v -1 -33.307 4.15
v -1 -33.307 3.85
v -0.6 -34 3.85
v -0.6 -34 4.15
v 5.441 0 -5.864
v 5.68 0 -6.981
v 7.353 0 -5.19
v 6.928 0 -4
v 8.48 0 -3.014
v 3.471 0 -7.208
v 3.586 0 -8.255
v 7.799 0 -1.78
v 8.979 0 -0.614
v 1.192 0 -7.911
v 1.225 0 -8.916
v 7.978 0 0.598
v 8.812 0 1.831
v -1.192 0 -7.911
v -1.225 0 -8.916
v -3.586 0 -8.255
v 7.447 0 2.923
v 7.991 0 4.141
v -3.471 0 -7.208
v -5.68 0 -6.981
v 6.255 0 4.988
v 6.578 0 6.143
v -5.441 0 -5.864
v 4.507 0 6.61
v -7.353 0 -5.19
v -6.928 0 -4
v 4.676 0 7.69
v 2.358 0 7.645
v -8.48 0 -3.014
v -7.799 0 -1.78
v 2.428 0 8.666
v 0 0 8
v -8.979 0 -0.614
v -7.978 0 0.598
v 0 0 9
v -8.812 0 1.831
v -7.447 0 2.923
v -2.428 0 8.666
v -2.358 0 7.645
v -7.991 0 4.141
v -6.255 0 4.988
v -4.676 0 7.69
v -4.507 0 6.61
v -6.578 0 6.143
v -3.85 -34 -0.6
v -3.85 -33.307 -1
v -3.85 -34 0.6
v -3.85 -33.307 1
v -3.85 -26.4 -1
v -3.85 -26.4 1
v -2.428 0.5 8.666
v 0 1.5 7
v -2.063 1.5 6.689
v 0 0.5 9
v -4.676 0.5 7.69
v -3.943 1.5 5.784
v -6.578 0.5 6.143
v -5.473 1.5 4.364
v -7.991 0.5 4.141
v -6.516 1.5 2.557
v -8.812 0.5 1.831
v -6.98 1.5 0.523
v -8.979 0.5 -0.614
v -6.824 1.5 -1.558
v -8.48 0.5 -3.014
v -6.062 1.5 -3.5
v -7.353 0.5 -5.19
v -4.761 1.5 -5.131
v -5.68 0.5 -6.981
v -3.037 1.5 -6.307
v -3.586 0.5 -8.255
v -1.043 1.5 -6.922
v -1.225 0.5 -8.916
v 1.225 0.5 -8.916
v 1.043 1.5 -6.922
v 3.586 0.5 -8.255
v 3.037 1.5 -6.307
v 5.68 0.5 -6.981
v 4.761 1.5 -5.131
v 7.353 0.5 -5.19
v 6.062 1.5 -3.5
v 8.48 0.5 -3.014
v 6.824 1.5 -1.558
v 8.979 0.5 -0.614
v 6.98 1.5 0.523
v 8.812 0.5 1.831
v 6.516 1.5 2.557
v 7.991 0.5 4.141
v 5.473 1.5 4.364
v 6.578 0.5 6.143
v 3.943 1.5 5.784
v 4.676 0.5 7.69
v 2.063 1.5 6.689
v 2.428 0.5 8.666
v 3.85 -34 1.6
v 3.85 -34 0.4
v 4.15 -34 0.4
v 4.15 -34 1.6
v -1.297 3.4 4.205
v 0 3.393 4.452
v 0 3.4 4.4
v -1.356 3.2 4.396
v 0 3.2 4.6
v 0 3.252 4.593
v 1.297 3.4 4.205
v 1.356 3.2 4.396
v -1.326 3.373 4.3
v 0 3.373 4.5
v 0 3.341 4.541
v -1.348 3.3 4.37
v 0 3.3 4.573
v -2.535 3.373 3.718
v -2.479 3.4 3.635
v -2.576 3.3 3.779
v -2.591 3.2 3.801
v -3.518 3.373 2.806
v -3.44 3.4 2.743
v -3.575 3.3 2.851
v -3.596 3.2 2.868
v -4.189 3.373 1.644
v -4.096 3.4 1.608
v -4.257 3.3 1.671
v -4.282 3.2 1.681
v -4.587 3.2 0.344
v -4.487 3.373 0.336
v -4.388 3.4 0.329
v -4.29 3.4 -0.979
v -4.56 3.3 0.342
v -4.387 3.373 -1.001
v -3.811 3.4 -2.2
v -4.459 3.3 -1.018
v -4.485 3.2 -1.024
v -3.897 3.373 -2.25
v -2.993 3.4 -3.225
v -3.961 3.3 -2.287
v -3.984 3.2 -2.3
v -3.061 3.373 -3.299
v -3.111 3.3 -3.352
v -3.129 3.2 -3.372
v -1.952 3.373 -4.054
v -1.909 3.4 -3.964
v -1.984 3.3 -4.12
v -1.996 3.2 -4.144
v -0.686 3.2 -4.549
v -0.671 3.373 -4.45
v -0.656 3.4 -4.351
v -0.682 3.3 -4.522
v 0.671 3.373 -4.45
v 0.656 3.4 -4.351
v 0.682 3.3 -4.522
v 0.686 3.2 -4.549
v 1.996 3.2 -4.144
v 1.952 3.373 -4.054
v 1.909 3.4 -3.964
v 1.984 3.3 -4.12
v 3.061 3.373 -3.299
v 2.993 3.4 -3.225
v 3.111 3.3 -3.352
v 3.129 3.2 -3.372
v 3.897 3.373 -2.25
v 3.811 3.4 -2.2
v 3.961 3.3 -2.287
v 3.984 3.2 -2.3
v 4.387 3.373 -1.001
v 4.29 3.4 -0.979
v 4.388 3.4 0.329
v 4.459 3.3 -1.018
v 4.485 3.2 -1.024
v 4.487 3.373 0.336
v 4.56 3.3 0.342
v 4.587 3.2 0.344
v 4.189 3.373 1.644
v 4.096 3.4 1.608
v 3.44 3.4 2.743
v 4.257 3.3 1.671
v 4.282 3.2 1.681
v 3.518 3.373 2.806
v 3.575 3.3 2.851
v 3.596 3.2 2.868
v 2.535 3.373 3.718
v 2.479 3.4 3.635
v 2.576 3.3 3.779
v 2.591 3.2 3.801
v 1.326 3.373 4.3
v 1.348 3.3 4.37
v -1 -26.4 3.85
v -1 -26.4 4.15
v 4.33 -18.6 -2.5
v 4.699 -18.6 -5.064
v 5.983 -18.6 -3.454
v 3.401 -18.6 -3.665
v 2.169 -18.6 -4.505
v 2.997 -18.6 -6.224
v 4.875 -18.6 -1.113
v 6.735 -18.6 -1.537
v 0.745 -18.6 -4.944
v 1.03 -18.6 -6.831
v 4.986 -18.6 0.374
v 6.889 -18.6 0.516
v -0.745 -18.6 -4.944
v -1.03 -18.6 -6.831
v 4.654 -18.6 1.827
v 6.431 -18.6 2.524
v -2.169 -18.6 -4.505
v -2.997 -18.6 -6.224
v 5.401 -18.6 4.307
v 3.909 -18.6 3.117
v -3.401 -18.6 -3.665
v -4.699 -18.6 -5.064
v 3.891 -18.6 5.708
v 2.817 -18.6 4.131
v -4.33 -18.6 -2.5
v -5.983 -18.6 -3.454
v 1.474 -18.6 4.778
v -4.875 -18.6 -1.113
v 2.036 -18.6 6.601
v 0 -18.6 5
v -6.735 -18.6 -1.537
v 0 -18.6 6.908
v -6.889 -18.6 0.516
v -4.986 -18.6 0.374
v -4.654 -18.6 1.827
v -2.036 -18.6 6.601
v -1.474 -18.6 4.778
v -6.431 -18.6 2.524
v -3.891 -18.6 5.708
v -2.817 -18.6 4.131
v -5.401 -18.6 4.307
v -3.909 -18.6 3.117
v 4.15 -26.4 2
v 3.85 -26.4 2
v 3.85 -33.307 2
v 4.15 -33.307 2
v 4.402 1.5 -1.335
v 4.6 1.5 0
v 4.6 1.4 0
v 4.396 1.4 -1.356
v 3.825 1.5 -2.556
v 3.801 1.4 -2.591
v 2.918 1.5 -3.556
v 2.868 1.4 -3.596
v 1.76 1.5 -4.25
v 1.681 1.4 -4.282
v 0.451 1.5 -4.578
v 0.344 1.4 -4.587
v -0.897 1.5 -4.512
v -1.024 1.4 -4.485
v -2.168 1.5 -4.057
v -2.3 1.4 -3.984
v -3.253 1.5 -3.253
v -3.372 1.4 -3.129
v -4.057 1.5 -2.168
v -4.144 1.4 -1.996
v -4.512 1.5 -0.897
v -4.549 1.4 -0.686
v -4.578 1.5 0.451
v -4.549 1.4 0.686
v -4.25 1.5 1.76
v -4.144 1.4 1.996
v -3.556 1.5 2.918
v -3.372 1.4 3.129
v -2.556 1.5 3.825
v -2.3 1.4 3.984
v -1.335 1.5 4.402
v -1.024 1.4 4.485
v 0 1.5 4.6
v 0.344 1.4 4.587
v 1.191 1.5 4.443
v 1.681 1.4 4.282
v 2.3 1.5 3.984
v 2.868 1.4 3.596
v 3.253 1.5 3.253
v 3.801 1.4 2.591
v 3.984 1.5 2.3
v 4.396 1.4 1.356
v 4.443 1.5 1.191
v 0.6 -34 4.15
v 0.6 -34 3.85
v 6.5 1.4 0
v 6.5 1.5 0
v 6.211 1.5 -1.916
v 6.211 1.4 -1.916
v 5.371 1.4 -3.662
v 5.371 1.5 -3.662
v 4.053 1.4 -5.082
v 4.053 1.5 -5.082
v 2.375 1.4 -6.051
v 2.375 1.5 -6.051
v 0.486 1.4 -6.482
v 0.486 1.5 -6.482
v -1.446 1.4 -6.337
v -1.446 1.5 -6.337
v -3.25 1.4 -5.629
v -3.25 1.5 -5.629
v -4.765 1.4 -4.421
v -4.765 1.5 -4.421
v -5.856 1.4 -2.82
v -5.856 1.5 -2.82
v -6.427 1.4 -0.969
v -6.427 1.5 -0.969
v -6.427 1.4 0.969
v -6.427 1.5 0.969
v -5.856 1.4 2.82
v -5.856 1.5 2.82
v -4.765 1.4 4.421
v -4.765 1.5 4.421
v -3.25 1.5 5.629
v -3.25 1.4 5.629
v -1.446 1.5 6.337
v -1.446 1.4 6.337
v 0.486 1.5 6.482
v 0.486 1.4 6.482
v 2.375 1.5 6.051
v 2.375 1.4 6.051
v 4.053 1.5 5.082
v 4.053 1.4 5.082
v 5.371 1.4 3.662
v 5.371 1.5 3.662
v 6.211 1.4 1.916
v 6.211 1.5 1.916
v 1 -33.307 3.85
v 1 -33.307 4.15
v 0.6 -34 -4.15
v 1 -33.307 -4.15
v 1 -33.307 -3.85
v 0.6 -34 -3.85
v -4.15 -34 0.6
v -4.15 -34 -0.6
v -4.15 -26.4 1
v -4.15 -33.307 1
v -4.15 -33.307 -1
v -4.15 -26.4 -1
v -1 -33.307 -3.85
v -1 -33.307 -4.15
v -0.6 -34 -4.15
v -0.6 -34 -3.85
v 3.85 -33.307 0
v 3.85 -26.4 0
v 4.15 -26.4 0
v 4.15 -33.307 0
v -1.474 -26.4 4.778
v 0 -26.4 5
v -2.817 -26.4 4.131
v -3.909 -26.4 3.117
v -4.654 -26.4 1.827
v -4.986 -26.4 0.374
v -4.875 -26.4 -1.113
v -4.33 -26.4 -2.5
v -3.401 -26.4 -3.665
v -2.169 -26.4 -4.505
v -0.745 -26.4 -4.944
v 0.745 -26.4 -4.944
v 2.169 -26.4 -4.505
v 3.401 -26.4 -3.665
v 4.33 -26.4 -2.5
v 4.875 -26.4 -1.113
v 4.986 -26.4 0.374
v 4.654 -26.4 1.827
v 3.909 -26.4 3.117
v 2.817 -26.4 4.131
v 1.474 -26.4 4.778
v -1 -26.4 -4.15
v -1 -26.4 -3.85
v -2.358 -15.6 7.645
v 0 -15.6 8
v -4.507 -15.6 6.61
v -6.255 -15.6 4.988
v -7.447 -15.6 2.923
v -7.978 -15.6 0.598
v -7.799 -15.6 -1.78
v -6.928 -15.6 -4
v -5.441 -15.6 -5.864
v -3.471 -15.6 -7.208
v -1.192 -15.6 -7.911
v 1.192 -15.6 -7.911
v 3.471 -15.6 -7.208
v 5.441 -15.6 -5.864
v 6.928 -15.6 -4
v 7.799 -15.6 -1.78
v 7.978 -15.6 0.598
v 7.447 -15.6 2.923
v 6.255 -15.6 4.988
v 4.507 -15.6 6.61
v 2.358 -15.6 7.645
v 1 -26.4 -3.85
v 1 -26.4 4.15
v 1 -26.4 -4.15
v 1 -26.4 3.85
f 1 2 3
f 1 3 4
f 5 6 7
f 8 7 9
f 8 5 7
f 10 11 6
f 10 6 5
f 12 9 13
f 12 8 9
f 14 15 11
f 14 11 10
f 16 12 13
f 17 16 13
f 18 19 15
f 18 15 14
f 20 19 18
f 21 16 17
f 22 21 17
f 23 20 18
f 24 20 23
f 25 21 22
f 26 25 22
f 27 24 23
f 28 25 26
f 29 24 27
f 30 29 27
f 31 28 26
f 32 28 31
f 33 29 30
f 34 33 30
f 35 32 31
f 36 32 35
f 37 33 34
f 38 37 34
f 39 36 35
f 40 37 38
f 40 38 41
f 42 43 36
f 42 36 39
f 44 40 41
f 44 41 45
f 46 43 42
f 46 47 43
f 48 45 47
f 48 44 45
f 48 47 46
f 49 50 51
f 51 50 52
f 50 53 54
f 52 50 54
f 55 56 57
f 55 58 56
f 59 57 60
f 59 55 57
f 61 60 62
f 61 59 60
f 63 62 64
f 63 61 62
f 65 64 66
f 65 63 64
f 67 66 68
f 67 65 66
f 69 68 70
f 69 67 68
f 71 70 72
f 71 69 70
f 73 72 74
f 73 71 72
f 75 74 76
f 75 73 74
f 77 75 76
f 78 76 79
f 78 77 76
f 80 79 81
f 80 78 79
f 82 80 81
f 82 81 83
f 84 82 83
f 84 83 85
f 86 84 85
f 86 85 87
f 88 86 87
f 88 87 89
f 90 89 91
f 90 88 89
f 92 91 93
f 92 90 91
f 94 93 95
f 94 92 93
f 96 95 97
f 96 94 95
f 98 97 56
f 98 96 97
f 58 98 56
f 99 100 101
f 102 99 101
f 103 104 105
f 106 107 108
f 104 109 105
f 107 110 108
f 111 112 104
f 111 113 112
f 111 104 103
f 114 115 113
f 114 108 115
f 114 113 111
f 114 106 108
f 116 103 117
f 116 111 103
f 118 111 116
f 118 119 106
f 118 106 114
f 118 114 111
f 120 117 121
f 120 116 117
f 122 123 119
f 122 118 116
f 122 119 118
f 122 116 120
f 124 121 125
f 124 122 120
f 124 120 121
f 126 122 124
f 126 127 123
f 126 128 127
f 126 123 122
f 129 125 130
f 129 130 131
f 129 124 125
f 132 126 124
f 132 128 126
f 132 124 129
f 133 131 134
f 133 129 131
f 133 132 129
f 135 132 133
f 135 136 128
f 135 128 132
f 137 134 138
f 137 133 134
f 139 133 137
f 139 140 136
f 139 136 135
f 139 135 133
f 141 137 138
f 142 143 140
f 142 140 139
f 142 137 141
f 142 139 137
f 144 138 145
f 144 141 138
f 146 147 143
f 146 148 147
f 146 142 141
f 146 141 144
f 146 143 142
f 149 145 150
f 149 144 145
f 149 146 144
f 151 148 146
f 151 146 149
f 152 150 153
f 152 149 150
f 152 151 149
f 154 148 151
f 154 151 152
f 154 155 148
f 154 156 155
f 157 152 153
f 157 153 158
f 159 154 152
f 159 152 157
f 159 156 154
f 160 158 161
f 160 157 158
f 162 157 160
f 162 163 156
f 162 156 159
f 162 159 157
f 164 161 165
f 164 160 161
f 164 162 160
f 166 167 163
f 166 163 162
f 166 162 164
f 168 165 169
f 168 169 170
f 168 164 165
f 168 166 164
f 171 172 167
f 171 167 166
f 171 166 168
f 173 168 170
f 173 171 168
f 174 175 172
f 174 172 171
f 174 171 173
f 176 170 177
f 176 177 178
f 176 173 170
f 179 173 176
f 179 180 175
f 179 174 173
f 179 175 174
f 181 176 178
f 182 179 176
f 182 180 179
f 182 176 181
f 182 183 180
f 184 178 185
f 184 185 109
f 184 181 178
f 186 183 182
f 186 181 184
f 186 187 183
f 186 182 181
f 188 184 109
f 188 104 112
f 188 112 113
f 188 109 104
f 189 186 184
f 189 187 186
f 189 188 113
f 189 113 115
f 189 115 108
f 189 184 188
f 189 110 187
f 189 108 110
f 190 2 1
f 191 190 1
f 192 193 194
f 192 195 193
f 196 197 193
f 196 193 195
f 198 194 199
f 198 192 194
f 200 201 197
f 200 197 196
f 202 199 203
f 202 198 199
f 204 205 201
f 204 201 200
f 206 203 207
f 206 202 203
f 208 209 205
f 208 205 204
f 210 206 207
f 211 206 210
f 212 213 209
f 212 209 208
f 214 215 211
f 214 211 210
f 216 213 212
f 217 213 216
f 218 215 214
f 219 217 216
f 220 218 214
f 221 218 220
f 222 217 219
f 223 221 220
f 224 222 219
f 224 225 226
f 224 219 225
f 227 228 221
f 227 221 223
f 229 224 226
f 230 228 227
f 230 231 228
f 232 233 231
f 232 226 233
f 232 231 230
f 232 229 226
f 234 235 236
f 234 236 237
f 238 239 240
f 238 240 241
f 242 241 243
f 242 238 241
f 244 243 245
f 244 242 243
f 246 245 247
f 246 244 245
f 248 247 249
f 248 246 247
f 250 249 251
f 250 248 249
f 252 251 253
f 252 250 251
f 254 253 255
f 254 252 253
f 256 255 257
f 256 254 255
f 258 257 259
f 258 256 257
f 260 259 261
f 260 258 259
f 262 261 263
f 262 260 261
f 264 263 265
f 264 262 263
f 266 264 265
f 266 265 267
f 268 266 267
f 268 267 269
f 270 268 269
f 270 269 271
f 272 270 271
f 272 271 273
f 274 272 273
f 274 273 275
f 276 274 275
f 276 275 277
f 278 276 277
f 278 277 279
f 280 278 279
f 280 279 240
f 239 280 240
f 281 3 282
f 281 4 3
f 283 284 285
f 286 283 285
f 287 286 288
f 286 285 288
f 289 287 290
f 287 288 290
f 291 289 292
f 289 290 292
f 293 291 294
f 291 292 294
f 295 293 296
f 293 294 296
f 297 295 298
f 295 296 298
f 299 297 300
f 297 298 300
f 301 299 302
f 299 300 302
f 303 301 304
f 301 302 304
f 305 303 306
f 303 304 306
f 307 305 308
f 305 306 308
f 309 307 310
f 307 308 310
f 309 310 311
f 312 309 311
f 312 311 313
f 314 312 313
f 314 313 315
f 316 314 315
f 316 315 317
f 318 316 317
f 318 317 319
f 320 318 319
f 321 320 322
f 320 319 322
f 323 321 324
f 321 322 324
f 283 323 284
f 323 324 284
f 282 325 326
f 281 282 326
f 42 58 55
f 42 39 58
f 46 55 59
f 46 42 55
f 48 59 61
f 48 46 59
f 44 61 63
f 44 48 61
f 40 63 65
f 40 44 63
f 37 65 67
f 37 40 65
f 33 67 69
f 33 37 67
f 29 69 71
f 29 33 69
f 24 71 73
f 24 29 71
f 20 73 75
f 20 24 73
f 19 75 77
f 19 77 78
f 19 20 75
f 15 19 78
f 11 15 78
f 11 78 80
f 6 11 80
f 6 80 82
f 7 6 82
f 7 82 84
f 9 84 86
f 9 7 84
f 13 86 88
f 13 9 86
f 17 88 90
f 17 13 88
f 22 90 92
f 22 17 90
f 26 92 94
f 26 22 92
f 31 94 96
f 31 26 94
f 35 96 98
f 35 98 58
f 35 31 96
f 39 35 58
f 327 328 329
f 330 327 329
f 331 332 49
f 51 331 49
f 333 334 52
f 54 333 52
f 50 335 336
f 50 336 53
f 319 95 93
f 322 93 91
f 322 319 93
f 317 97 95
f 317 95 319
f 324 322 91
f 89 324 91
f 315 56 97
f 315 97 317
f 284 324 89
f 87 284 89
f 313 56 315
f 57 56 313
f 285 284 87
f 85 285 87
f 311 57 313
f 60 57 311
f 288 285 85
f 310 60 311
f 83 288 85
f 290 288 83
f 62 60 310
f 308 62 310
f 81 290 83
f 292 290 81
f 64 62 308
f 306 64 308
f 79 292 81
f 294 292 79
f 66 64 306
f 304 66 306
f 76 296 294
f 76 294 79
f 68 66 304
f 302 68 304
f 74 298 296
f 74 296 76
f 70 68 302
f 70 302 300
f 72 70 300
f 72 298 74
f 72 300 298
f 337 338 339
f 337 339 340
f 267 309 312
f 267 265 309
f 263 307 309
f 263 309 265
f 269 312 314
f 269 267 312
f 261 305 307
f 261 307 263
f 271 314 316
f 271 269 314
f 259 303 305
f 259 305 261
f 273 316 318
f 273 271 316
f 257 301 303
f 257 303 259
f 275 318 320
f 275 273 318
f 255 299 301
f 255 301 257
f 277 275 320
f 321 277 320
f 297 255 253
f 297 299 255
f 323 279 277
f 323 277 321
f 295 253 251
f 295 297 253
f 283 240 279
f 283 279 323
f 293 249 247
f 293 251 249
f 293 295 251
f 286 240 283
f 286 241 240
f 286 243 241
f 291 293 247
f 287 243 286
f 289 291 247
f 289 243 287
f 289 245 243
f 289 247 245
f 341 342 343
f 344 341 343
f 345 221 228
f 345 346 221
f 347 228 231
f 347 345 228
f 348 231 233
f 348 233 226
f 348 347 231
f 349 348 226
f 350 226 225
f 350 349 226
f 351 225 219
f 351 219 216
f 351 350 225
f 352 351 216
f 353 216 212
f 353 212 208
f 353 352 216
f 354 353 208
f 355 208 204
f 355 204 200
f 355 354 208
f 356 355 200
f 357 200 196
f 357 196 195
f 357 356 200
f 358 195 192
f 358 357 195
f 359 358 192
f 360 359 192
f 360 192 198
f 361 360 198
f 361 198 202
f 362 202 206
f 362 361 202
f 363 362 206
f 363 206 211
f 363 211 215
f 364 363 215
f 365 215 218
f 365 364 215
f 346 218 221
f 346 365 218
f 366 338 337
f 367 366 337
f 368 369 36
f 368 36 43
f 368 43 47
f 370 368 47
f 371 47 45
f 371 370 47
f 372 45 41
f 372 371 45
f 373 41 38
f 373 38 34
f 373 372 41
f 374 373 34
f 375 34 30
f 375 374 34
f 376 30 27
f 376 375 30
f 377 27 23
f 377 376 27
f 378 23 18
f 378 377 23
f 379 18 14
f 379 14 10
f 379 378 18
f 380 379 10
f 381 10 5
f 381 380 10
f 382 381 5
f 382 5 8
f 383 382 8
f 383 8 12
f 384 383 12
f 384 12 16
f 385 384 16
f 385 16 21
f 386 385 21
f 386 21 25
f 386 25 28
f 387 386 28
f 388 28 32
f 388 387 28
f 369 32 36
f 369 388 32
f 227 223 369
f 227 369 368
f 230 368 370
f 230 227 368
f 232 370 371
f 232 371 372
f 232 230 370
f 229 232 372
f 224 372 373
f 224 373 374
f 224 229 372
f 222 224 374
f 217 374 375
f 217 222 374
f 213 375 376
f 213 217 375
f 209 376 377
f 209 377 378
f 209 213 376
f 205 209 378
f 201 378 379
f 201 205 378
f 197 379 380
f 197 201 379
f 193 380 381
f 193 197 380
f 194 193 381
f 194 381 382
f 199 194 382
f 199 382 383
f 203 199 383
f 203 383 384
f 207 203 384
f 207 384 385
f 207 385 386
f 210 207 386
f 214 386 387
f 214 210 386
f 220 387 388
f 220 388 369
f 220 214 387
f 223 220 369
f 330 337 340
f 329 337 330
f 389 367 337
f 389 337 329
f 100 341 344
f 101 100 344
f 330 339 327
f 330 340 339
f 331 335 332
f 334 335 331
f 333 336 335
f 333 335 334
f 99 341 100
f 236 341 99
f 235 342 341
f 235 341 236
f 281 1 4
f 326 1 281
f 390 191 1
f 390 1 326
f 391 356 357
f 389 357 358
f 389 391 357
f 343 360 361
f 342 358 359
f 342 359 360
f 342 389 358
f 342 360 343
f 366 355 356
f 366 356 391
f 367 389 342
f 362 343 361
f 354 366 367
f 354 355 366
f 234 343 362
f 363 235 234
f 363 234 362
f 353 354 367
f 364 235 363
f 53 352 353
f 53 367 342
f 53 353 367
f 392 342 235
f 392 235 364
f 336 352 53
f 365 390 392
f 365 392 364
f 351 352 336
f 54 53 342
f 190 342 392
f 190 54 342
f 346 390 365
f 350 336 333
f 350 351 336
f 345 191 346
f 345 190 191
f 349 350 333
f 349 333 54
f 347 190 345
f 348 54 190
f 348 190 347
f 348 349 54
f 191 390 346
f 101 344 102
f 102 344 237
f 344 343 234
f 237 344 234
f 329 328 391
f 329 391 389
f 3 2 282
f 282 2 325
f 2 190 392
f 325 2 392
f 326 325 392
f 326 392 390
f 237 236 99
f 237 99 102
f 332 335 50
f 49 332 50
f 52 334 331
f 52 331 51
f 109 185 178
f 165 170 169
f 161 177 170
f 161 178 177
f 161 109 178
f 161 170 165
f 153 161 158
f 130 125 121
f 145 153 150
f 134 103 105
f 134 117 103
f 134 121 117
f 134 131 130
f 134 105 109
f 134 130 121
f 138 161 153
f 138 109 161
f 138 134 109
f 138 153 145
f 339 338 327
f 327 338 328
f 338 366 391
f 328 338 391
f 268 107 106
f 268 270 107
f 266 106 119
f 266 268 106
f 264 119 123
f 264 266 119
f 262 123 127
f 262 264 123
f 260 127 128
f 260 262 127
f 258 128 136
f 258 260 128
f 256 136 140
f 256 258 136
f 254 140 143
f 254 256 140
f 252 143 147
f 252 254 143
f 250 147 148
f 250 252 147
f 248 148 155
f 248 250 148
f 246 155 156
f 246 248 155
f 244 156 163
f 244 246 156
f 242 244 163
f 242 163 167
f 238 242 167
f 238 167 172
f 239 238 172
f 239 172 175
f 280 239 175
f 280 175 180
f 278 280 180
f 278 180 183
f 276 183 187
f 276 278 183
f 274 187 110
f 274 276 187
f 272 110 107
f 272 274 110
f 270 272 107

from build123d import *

# Parameters (mm, degrees)
FILLET1_R             = 0.2
SKETCH2_R             = 6.5
SKETCH2_R_2           = 4.6
CUT_EXTRUDE1_DEPTH    = 0.1
SKETCH3_W             = 2
SKETCH3_H             = 0.3
SKETCH3_W_2           = 0.3
SKETCH3_H_2           = 2
EXTRUDE_THIN1_DEPTH   = 7.6
CHAMFER1_SIZE         = 0.4
CHAMFER1_SIZE2        = 0.692820323
CHAMFER1_PART_2_SIZE  = 0.4
CHAMFER1_PART_2_SIZE2 = 0.692820323
CHAMFER1_PART_3_SIZE  = 0.4
CHAMFER1_PART_3_SIZE2 = 0.692820323
CHAMFER1_PART_4_SIZE  = 0.4
CHAMFER1_PART_4_SIZE2 = 0.692820323
CHAMFER2_SIZE         = 3
CHAMFER2_SIZE2        = 1.091910703


with BuildPart() as part:
    # Sketch1 → Revolve1 (revolve)
    with BuildSketch(Plane(origin=(0, 0, 0), x_dir=(0, 0, -1), z_dir=(1, 0, 0))):
        Polygon((0, 3.4), (-4.6, 3.4), (-4.6, 1.5), (-7, 1.5), (-9, 0.5), (-9, 0), (-8, 0), (-8, -18.6), (-5, -18.6), (-5, -26.4), (0, -26.4), align=None)
    revolve(axis=Axis((0, 14.375, 0), (0, -1, 0)))

    # Fillet1
    fillet1_edges = [part.edges().sort_by_distance(p)[0] for p in [
        (0, 3.4, -4.6),
    ]]
    fillet(fillet1_edges, radius=FILLET1_R)

    # Sketch2 → Cut-Extrude1 (cut)
    with BuildSketch(Plane(origin=(0, 1.5, 0), x_dir=(1, 0, 0), z_dir=(0, 1, 0))):
        Circle(SKETCH2_R)
        Circle(SKETCH2_R_2, mode=Mode.SUBTRACT)
    extrude(amount=-CUT_EXTRUDE1_DEPTH, mode=Mode.SUBTRACT)

    # Sketch3 → Extrude-Thin1 (add)
    with BuildSketch(Plane.XZ.offset(26.4)):
        with Locations((0, 4)):
            Rectangle(SKETCH3_W, SKETCH3_H)
        with Locations((0, -4)):
            Rectangle(SKETCH3_W, SKETCH3_H)
        with Locations((-4, 0)):
            Rectangle(SKETCH3_W_2, SKETCH3_H_2)
        with Locations((4, 1)):
            Rectangle(SKETCH3_W_2, SKETCH3_H_2)
    extrude(amount=EXTRUDE_THIN1_DEPTH)

    # Chamfer1
    chamfer1_edges = [part.edges().sort_by_distance(p)[0] for p in [
        (1, -34, 4),
        (-1, -34, 4),
    ]]
    chamfer1_side = [part.faces().sort_by_distance(p)[0] for p in [
        (0, -34, 4),
    ]]
    chamfer(chamfer1_edges, length=CHAMFER1_SIZE, length2=CHAMFER1_SIZE2, reference=chamfer1_side[0])

    # Chamfer1 part 2
    chamfer1_part_2_edges = [part.edges().sort_by_distance(p)[0] for p in [
        (1, -34, -4),
        (-1, -34, -4),
    ]]
    chamfer1_part_2_side = [part.faces().sort_by_distance(p)[0] for p in [
        (0, -34, -4),
    ]]
    chamfer(chamfer1_part_2_edges, length=CHAMFER1_PART_2_SIZE, length2=CHAMFER1_PART_2_SIZE2, reference=chamfer1_part_2_side[0])

    # Chamfer1 part 3
    chamfer1_part_3_edges = [part.edges().sort_by_distance(p)[0] for p in [
        (-4, -34, -1),
        (-4, -34, 1),
    ]]
    chamfer1_part_3_side = [part.faces().sort_by_distance(p)[0] for p in [
        (-4, -34, 0),
    ]]
    chamfer(chamfer1_part_3_edges, length=CHAMFER1_PART_3_SIZE, length2=CHAMFER1_PART_3_SIZE2, reference=chamfer1_part_3_side[0])

    # Chamfer1 part 4
    chamfer1_part_4_edges = [part.edges().sort_by_distance(p)[0] for p in [
        (4, -34, 2),
        (4, -34, 0),
    ]]
    chamfer1_part_4_side = [part.faces().sort_by_distance(p)[0] for p in [
        (4, -34, 1),
    ]]
    chamfer(chamfer1_part_4_edges, length=CHAMFER1_PART_4_SIZE, length2=CHAMFER1_PART_4_SIZE2, reference=chamfer1_part_4_side[0])

    # Chamfer2
    chamfer2_edges = [part.edges().sort_by_distance(p)[0] for p in [
        (0, -18.6, -8),
    ]]
    chamfer2_side = [part.faces().sort_by_distance(p)[0] for p in [
        (0, -9.3, -8),
    ]]
    chamfer(chamfer2_edges, length=CHAMFER2_SIZE, length2=CHAMFER2_SIZE2, reference=chamfer2_side[0])


solid = part.part
